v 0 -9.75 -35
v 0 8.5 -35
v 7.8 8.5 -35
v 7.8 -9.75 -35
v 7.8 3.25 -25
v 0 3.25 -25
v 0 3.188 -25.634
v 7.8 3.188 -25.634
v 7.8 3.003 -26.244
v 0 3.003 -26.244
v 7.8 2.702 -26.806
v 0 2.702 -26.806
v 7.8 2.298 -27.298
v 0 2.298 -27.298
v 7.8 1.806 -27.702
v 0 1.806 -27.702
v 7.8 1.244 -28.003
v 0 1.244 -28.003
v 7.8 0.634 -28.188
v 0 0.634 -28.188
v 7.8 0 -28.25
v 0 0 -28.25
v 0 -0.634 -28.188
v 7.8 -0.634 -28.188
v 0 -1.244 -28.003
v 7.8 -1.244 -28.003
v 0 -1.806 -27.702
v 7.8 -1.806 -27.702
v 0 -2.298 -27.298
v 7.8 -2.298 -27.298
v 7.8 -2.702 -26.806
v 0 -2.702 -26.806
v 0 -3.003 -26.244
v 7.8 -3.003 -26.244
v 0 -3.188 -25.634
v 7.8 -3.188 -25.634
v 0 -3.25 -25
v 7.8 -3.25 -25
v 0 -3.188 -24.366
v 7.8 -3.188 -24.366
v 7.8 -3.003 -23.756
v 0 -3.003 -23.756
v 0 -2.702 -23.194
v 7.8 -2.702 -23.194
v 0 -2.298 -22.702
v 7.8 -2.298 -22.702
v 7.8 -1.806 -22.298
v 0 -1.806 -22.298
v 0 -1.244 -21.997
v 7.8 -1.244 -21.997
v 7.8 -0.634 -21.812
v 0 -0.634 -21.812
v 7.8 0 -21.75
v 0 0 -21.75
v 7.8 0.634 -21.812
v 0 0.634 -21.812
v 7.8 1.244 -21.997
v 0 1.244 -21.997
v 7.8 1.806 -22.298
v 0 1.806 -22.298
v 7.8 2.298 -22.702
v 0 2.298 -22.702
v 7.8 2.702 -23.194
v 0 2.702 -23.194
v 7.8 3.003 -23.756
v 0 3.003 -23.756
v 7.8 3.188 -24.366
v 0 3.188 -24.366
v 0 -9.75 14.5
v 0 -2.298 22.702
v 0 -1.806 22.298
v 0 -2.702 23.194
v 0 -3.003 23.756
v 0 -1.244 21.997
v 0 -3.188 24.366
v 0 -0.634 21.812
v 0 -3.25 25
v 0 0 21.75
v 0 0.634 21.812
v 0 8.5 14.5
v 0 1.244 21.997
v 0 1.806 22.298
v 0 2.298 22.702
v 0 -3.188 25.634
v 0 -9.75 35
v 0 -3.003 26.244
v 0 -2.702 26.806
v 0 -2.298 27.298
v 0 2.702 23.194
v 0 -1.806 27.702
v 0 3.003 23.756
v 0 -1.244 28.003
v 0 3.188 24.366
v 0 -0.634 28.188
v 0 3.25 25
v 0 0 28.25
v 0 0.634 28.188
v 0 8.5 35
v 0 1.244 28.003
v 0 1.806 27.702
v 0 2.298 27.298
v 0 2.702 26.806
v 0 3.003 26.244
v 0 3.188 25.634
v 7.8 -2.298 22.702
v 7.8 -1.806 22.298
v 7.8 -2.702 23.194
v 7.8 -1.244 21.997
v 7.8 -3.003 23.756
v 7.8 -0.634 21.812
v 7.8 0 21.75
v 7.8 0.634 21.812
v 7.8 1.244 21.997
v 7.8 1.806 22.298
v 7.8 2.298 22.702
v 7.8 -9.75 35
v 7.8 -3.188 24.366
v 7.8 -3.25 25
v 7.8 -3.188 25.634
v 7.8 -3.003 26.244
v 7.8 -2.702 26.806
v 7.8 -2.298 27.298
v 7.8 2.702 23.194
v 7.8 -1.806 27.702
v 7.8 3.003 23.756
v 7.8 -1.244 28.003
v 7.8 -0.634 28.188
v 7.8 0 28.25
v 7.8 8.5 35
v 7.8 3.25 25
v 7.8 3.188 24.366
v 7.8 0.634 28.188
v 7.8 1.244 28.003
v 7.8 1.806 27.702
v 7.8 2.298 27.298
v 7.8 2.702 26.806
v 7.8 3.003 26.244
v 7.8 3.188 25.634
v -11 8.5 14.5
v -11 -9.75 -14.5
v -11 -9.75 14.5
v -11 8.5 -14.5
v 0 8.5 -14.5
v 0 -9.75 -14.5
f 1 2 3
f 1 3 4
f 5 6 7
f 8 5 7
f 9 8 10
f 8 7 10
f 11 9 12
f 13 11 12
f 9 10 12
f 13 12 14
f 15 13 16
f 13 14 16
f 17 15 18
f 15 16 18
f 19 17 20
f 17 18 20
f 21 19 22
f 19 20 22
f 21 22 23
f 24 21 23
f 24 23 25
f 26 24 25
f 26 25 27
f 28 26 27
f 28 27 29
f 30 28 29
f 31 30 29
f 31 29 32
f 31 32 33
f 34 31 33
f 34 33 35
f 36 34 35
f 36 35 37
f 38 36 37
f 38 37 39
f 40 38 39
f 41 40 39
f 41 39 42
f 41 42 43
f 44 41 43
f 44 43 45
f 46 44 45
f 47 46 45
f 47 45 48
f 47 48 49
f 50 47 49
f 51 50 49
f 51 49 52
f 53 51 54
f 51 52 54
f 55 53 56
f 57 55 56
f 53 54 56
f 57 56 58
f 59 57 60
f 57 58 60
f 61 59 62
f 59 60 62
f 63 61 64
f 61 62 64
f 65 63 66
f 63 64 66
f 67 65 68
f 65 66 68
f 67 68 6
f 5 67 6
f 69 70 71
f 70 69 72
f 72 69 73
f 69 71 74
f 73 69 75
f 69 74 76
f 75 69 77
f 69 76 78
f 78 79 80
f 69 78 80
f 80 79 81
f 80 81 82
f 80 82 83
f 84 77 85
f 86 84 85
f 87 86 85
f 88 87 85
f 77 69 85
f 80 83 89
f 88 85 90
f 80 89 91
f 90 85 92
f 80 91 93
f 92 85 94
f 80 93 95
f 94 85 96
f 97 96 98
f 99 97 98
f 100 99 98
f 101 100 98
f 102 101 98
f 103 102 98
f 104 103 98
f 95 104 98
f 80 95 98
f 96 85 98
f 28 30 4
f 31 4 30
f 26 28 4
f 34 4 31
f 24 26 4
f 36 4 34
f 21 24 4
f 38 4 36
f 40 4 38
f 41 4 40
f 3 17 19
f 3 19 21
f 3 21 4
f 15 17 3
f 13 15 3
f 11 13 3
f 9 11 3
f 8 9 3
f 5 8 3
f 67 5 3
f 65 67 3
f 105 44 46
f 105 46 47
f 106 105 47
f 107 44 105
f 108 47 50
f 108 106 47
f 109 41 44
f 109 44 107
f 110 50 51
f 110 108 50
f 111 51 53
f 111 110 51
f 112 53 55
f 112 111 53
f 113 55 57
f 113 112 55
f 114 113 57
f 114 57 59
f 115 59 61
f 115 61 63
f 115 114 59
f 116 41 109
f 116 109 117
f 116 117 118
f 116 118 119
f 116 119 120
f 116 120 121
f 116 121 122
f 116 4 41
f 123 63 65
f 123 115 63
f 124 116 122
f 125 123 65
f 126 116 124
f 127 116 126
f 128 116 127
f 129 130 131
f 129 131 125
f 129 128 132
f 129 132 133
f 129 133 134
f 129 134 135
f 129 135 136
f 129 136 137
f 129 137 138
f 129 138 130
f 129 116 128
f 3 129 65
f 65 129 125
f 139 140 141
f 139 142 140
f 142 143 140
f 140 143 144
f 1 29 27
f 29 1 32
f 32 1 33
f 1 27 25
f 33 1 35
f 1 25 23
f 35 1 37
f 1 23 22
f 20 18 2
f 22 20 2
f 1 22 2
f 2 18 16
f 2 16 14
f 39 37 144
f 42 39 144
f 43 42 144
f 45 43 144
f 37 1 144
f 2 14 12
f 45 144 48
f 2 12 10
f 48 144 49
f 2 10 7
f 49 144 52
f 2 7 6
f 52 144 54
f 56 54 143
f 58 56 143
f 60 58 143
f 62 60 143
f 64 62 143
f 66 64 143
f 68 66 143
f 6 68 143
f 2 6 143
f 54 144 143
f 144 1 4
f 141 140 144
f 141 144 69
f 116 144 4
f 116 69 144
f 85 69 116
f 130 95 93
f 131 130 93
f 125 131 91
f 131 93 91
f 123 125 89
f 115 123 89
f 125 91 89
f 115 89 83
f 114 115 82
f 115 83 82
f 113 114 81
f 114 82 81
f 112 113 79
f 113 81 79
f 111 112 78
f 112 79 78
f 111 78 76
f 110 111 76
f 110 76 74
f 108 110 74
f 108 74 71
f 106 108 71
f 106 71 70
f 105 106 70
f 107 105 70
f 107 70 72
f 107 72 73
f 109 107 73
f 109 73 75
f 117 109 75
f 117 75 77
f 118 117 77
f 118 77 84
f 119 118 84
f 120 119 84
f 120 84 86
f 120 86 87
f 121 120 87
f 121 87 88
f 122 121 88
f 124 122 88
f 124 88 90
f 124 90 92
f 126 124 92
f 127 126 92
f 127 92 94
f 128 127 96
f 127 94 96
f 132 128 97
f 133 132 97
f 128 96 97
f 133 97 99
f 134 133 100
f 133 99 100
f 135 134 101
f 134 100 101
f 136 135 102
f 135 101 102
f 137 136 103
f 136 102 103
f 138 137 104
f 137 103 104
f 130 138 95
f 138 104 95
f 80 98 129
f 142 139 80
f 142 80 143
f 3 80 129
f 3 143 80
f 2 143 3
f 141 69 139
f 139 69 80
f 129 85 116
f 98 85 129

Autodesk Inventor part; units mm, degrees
ref_plane "YZ Plane" through (0, 0, 0) normal (1, 0, 0) x (0, 1, 0)
ref_plane "XZ Plane" through (0, 0, 0) normal (0, 1, 0) x (-1, 0, 0)
ref_plane "XY Plane" through (0, 0, 0) normal (0, 0, 1) x (1, 0, 0)
sketch "Эскиз1" plane through (0, 0, 0) normal (1, 0, 0) x (0, 1, 0)
  line L0 (-9.5, 35) -> (9.5, 35)
  line L1 (9.5, 35) -> (9.5, -35)
  line L2 (9.5, -35) -> (-9.5, -35)
  line L3 (-9.5, -35) -> (-9.5, 35)
  line L4 (-9.5, 35) -> (9.5, -35) construction
  line L5 (9.5, 35) -> (-9.5, -35) construction
  line L6 (0, 35) -> (0, 25)
  circle A0 centre (0, 25) radius 3.25
  line L7 (0, -35) -> (0, -25)
  circle A1 centre (0, -25) radius 3.25
  point P0 (0, 0)
  dimension "d0" = 19
  dimension "d1" = 70
  dimension "d2" = 10
  dimension "d3" = 6.5
  dimension "d4" = 10
  dimension "d5" = 6.5
extrude "Выдавливание1" add sketch "Эскиз1" along normal blind 7.8
sketch "Эскиз2" plane through (0, 0, 0) normal (-1, 0, 0) x (0, 0, 1)
  line L0 (-35, 9.5) -> (35, 9.5) projected
  line L1 (-14.5, -9.5) -> (14.5, -9.5)
  line L2 (14.5, -9.5) -> (14.5, 9.5)
  line L3 (14.5, 9.5) -> (-14.5, 9.5)
  line L4 (-14.5, 9.5) -> (-14.5, -9.5)
  line L5 (-14.5, -9.5) -> (14.5, 9.5) construction
  line L6 (14.5, -9.5) -> (-14.5, 9.5) construction
  point P0 (0, 0)
  dimension "d8" = 29
extrude "Выдавливание2" add sketch "Эскиз2" along normal blind 11
move faces "Перенос1" translate (0, -0.25, 0) faces at (5.2, -9.5, -4.8333)
move faces "Перенос3" translate (0, -1, 0) faces at (5.2, 9.5, 4.8333)
equation "\"d4\" = d2"
equation "\"d5\" = d3"
properties part number "КВ33.044.202 - Фиксатор каретки" material "Пластик АБС"
